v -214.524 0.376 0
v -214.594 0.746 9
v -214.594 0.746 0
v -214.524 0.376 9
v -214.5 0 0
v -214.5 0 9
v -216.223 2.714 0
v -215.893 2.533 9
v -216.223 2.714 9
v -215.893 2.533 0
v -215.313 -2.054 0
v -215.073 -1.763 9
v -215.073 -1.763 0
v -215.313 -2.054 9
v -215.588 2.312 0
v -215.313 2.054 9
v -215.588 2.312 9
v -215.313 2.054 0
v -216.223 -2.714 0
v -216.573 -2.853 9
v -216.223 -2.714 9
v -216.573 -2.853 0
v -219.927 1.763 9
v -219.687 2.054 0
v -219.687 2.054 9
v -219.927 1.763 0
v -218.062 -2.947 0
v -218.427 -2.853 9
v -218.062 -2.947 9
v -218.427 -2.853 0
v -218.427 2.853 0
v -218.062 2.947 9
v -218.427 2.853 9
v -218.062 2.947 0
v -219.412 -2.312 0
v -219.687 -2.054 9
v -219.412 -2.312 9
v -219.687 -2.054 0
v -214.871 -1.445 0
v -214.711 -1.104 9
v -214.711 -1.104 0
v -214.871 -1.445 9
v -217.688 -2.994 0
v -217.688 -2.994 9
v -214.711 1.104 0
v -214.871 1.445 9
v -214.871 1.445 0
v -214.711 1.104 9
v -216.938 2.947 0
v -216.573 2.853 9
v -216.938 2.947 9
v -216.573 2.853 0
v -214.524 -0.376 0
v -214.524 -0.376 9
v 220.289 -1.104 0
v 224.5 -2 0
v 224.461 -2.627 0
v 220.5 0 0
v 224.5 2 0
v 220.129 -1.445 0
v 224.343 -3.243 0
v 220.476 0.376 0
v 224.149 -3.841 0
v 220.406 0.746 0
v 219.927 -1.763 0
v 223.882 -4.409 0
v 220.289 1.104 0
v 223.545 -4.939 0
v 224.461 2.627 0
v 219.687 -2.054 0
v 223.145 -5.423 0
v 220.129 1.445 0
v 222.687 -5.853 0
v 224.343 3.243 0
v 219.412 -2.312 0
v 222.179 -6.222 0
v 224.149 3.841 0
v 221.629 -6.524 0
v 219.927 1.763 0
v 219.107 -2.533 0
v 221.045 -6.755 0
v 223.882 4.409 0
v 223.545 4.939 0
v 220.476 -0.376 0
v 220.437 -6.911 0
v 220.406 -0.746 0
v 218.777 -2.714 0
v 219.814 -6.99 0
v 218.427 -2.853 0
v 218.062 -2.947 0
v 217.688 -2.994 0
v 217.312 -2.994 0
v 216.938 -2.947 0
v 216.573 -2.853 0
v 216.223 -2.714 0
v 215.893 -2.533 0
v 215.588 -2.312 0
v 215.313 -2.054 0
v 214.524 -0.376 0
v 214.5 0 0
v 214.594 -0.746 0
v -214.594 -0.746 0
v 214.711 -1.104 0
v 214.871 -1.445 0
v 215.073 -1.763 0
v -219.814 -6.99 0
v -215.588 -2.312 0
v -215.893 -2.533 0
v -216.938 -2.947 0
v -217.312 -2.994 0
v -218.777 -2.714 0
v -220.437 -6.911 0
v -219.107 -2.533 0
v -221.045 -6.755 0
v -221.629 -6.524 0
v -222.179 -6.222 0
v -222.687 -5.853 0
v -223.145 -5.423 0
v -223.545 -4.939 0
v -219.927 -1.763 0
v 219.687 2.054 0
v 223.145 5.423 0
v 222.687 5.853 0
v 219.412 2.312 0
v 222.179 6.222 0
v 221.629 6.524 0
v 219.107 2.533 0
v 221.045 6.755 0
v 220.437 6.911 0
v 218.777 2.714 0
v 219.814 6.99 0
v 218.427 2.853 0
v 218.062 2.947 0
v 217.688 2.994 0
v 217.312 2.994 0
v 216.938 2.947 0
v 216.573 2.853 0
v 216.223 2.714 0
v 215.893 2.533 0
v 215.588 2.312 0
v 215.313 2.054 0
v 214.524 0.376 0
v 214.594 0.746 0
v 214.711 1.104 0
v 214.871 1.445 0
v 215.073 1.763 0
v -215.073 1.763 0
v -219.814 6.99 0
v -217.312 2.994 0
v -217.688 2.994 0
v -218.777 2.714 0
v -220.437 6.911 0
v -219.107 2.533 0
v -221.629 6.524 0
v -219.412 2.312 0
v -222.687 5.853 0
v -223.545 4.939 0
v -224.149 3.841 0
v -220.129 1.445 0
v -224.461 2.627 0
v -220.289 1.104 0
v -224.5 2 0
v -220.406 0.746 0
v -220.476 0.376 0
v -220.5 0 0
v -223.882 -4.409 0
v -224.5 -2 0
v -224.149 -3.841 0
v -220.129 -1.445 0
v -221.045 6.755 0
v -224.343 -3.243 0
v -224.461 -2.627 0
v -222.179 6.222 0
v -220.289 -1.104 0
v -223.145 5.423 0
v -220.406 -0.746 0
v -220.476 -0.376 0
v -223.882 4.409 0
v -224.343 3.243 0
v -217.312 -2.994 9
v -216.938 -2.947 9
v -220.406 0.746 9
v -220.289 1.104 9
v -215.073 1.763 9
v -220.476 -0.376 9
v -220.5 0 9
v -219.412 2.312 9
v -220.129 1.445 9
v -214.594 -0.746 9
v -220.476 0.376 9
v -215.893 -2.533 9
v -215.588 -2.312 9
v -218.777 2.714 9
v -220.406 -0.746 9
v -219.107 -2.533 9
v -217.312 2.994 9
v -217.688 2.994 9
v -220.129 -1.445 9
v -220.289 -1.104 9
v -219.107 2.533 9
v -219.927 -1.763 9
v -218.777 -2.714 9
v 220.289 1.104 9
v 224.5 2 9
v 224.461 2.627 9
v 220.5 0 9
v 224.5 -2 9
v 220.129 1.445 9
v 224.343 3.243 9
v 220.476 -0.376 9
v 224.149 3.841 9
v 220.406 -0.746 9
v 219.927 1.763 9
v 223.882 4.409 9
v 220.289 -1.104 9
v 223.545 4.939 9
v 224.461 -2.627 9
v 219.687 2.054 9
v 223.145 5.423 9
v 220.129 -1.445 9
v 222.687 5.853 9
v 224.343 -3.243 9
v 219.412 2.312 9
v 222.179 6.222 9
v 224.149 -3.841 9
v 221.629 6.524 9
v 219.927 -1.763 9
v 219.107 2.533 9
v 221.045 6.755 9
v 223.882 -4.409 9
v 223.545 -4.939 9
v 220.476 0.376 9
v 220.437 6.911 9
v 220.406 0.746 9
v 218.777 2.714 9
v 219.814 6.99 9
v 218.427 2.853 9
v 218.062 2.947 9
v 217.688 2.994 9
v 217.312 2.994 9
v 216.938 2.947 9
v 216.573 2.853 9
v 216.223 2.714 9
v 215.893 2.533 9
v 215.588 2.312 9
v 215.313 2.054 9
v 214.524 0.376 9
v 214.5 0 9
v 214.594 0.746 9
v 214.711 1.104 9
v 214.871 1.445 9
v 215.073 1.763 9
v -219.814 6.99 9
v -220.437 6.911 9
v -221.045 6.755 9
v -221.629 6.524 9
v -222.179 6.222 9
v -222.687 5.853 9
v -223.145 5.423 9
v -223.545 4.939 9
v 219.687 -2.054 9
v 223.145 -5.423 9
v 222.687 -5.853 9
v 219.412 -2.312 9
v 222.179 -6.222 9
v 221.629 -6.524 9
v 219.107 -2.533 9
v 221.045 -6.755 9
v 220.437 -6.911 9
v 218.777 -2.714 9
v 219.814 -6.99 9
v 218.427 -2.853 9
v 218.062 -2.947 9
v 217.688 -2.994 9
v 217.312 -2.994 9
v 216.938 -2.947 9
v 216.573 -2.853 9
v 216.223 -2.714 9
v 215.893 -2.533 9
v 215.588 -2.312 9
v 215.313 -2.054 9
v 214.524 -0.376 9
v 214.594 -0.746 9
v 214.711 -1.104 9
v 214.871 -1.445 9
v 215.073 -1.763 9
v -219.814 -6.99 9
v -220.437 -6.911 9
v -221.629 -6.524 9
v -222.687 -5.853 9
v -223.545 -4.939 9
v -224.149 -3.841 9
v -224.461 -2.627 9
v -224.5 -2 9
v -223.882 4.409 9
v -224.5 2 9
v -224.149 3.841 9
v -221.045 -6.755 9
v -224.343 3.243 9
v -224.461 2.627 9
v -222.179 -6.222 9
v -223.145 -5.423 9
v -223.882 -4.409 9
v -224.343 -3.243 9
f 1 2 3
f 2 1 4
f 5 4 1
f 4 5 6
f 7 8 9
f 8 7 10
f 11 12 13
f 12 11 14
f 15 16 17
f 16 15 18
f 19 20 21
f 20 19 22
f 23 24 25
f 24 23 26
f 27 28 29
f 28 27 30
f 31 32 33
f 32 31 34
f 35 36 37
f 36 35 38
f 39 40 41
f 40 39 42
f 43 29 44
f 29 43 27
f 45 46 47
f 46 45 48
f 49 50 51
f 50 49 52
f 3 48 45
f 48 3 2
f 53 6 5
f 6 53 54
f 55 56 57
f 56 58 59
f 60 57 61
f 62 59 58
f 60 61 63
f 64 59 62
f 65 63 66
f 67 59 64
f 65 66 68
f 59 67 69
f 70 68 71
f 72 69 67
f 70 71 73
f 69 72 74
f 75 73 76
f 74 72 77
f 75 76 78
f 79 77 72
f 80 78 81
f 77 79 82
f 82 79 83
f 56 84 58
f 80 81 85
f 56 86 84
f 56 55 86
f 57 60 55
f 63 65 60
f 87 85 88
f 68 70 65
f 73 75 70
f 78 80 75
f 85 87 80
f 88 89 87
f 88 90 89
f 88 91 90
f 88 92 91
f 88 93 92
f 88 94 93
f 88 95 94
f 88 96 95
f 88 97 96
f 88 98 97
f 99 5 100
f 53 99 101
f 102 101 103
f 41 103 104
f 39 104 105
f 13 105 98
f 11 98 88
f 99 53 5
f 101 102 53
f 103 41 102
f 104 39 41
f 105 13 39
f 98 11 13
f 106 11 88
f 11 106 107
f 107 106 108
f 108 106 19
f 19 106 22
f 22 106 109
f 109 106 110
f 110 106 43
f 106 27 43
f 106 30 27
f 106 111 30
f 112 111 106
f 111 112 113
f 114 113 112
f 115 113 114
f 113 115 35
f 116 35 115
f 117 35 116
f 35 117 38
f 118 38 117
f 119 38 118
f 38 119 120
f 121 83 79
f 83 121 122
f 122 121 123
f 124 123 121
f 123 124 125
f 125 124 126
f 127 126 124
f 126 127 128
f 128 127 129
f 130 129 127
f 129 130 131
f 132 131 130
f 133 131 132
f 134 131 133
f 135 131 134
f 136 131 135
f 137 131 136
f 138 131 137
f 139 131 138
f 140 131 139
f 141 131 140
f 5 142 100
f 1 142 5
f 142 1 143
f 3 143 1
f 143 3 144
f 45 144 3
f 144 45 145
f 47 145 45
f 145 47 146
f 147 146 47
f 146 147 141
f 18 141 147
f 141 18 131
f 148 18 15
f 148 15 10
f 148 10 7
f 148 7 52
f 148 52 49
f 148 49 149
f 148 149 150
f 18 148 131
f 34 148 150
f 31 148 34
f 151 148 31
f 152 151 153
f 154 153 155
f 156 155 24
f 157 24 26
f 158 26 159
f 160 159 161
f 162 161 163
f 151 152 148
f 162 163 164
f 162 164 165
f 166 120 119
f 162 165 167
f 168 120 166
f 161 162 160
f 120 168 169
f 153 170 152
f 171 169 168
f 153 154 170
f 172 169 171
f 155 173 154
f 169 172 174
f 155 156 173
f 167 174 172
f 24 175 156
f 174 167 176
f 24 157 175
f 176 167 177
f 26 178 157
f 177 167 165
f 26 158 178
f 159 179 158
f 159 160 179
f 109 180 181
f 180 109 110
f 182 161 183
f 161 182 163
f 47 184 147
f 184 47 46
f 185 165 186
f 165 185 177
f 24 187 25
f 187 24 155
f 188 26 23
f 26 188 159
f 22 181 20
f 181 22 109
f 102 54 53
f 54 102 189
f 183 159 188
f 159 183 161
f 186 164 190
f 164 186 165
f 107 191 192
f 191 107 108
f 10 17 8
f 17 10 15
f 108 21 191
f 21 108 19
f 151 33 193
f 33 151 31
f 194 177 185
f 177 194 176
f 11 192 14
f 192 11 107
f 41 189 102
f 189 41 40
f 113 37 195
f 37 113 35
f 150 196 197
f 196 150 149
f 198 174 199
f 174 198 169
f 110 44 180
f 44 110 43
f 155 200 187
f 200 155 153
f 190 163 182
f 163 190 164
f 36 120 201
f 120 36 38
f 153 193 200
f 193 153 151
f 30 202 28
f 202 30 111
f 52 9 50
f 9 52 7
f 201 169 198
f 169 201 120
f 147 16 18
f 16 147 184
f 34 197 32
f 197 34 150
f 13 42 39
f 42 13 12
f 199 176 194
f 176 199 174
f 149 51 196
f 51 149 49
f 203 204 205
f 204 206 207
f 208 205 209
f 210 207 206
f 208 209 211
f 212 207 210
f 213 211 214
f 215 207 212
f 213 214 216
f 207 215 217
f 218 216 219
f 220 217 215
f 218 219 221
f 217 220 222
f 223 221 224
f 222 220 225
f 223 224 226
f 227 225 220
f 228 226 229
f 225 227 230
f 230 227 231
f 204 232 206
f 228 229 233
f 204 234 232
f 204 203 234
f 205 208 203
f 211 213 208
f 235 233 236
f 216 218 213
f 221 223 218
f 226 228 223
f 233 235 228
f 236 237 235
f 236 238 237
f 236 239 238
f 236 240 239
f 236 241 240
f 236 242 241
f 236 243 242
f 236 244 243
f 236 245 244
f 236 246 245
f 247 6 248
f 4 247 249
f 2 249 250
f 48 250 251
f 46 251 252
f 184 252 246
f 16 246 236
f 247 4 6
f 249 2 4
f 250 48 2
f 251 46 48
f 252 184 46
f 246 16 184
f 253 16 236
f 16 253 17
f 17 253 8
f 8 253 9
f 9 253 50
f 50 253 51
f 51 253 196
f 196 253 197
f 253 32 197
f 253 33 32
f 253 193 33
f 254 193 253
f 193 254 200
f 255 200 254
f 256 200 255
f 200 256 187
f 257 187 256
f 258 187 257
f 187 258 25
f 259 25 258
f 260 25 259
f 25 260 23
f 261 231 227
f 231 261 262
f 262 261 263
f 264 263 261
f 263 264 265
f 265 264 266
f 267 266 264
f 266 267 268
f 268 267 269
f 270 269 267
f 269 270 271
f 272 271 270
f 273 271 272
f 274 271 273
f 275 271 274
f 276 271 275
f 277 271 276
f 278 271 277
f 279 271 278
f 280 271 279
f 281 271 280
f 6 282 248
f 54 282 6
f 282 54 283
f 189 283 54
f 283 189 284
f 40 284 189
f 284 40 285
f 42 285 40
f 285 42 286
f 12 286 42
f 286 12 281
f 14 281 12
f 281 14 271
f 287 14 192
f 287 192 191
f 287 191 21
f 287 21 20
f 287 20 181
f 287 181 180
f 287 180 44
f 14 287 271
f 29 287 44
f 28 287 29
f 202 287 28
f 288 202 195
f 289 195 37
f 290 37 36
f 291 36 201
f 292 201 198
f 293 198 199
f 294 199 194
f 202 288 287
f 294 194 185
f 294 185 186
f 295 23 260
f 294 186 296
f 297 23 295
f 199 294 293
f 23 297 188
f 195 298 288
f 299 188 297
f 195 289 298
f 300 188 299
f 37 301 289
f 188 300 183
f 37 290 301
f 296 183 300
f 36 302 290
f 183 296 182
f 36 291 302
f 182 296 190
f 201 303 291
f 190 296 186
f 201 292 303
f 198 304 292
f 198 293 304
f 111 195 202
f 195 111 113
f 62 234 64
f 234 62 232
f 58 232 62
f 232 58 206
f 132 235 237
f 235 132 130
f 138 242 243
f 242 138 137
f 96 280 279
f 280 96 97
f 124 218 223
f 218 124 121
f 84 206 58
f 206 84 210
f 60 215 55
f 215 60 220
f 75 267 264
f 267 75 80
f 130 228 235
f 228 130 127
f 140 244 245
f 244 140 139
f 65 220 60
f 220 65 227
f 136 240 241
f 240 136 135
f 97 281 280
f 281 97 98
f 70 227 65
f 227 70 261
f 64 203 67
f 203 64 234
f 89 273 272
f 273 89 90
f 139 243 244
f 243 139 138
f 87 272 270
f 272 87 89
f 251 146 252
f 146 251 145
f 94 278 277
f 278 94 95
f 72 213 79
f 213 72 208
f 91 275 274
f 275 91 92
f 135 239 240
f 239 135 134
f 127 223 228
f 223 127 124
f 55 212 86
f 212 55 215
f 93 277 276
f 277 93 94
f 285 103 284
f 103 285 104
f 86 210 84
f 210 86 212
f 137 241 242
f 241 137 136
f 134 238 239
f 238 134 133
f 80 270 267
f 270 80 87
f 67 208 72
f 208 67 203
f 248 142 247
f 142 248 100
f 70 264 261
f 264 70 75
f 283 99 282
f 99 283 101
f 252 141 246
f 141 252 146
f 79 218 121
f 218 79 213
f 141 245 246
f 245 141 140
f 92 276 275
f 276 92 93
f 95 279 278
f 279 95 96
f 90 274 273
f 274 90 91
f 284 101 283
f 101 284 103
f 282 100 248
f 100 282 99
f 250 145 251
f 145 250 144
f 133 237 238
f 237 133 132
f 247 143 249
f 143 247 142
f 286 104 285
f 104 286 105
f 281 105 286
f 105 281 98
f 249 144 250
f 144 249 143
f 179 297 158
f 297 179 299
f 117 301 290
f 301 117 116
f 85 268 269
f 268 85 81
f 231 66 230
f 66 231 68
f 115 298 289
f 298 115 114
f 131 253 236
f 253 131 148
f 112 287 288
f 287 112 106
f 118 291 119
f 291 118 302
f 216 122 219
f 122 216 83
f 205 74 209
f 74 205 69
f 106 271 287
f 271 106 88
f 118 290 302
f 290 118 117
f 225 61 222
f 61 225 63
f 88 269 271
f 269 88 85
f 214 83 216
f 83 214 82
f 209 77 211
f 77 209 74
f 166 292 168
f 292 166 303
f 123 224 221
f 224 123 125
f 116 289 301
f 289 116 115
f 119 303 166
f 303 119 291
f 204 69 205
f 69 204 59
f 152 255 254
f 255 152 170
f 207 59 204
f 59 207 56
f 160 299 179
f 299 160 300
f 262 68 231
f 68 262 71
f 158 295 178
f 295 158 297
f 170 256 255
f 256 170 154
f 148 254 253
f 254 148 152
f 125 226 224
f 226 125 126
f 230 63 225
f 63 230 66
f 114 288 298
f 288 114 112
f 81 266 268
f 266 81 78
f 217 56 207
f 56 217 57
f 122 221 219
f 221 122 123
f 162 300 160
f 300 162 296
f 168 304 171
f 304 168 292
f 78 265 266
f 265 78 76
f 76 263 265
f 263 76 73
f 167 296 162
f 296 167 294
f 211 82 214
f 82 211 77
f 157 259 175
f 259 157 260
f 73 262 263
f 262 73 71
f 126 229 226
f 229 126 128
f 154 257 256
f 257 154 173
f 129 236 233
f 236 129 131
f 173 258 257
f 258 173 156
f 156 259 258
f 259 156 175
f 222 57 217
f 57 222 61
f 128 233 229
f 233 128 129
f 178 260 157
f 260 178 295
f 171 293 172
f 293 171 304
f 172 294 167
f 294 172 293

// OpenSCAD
$fn = 50;


difference() {
	union() {
		hull() {
			translate(v = [-219.5000000000, 2.0000000000, 0]) {
				cylinder(h = 9, r = 5);
			}
			translate(v = [219.5000000000, 2.0000000000, 0]) {
				cylinder(h = 9, r = 5);
			}
			translate(v = [-219.5000000000, -2.0000000000, 0]) {
				cylinder(h = 9, r = 5);
			}
			translate(v = [219.5000000000, -2.0000000000, 0]) {
				cylinder(h = 9, r = 5);
			}
		}
	}
	union() {
		translate(v = [-217.5000000000, 0.0000000000, 0]) {
			cylinder(h = 9, r = 3.0000000000);
		}
		translate(v = [217.5000000000, 0.0000000000, 0]) {
			cylinder(h = 9, r = 3.0000000000);
		}
		translate(v = [-217.5000000000, 0.0000000000, 0]) {
			cylinder(h = 9, r = 1.5000000000);
		}
		translate(v = [217.5000000000, 0.0000000000, 0]) {
			cylinder(h = 9, r = 1.5000000000);
		}
		translate(v = [-217.5000000000, 0.0000000000, 0]) {
			cylinder(h = 9, r = 1.5000000000);
		}
		translate(v = [217.5000000000, 0.0000000000, 0]) {
			cylinder(h = 9, r = 1.5000000000);
		}
		translate(v = [-217.5000000000, 0.0000000000, 0]) {
			cylinder(h = 9, r = 1.5000000000);
		}
		translate(v = [217.5000000000, 0.0000000000, 0]) {
			cylinder(h = 9, r = 1.5000000000);
		}
	}
}
